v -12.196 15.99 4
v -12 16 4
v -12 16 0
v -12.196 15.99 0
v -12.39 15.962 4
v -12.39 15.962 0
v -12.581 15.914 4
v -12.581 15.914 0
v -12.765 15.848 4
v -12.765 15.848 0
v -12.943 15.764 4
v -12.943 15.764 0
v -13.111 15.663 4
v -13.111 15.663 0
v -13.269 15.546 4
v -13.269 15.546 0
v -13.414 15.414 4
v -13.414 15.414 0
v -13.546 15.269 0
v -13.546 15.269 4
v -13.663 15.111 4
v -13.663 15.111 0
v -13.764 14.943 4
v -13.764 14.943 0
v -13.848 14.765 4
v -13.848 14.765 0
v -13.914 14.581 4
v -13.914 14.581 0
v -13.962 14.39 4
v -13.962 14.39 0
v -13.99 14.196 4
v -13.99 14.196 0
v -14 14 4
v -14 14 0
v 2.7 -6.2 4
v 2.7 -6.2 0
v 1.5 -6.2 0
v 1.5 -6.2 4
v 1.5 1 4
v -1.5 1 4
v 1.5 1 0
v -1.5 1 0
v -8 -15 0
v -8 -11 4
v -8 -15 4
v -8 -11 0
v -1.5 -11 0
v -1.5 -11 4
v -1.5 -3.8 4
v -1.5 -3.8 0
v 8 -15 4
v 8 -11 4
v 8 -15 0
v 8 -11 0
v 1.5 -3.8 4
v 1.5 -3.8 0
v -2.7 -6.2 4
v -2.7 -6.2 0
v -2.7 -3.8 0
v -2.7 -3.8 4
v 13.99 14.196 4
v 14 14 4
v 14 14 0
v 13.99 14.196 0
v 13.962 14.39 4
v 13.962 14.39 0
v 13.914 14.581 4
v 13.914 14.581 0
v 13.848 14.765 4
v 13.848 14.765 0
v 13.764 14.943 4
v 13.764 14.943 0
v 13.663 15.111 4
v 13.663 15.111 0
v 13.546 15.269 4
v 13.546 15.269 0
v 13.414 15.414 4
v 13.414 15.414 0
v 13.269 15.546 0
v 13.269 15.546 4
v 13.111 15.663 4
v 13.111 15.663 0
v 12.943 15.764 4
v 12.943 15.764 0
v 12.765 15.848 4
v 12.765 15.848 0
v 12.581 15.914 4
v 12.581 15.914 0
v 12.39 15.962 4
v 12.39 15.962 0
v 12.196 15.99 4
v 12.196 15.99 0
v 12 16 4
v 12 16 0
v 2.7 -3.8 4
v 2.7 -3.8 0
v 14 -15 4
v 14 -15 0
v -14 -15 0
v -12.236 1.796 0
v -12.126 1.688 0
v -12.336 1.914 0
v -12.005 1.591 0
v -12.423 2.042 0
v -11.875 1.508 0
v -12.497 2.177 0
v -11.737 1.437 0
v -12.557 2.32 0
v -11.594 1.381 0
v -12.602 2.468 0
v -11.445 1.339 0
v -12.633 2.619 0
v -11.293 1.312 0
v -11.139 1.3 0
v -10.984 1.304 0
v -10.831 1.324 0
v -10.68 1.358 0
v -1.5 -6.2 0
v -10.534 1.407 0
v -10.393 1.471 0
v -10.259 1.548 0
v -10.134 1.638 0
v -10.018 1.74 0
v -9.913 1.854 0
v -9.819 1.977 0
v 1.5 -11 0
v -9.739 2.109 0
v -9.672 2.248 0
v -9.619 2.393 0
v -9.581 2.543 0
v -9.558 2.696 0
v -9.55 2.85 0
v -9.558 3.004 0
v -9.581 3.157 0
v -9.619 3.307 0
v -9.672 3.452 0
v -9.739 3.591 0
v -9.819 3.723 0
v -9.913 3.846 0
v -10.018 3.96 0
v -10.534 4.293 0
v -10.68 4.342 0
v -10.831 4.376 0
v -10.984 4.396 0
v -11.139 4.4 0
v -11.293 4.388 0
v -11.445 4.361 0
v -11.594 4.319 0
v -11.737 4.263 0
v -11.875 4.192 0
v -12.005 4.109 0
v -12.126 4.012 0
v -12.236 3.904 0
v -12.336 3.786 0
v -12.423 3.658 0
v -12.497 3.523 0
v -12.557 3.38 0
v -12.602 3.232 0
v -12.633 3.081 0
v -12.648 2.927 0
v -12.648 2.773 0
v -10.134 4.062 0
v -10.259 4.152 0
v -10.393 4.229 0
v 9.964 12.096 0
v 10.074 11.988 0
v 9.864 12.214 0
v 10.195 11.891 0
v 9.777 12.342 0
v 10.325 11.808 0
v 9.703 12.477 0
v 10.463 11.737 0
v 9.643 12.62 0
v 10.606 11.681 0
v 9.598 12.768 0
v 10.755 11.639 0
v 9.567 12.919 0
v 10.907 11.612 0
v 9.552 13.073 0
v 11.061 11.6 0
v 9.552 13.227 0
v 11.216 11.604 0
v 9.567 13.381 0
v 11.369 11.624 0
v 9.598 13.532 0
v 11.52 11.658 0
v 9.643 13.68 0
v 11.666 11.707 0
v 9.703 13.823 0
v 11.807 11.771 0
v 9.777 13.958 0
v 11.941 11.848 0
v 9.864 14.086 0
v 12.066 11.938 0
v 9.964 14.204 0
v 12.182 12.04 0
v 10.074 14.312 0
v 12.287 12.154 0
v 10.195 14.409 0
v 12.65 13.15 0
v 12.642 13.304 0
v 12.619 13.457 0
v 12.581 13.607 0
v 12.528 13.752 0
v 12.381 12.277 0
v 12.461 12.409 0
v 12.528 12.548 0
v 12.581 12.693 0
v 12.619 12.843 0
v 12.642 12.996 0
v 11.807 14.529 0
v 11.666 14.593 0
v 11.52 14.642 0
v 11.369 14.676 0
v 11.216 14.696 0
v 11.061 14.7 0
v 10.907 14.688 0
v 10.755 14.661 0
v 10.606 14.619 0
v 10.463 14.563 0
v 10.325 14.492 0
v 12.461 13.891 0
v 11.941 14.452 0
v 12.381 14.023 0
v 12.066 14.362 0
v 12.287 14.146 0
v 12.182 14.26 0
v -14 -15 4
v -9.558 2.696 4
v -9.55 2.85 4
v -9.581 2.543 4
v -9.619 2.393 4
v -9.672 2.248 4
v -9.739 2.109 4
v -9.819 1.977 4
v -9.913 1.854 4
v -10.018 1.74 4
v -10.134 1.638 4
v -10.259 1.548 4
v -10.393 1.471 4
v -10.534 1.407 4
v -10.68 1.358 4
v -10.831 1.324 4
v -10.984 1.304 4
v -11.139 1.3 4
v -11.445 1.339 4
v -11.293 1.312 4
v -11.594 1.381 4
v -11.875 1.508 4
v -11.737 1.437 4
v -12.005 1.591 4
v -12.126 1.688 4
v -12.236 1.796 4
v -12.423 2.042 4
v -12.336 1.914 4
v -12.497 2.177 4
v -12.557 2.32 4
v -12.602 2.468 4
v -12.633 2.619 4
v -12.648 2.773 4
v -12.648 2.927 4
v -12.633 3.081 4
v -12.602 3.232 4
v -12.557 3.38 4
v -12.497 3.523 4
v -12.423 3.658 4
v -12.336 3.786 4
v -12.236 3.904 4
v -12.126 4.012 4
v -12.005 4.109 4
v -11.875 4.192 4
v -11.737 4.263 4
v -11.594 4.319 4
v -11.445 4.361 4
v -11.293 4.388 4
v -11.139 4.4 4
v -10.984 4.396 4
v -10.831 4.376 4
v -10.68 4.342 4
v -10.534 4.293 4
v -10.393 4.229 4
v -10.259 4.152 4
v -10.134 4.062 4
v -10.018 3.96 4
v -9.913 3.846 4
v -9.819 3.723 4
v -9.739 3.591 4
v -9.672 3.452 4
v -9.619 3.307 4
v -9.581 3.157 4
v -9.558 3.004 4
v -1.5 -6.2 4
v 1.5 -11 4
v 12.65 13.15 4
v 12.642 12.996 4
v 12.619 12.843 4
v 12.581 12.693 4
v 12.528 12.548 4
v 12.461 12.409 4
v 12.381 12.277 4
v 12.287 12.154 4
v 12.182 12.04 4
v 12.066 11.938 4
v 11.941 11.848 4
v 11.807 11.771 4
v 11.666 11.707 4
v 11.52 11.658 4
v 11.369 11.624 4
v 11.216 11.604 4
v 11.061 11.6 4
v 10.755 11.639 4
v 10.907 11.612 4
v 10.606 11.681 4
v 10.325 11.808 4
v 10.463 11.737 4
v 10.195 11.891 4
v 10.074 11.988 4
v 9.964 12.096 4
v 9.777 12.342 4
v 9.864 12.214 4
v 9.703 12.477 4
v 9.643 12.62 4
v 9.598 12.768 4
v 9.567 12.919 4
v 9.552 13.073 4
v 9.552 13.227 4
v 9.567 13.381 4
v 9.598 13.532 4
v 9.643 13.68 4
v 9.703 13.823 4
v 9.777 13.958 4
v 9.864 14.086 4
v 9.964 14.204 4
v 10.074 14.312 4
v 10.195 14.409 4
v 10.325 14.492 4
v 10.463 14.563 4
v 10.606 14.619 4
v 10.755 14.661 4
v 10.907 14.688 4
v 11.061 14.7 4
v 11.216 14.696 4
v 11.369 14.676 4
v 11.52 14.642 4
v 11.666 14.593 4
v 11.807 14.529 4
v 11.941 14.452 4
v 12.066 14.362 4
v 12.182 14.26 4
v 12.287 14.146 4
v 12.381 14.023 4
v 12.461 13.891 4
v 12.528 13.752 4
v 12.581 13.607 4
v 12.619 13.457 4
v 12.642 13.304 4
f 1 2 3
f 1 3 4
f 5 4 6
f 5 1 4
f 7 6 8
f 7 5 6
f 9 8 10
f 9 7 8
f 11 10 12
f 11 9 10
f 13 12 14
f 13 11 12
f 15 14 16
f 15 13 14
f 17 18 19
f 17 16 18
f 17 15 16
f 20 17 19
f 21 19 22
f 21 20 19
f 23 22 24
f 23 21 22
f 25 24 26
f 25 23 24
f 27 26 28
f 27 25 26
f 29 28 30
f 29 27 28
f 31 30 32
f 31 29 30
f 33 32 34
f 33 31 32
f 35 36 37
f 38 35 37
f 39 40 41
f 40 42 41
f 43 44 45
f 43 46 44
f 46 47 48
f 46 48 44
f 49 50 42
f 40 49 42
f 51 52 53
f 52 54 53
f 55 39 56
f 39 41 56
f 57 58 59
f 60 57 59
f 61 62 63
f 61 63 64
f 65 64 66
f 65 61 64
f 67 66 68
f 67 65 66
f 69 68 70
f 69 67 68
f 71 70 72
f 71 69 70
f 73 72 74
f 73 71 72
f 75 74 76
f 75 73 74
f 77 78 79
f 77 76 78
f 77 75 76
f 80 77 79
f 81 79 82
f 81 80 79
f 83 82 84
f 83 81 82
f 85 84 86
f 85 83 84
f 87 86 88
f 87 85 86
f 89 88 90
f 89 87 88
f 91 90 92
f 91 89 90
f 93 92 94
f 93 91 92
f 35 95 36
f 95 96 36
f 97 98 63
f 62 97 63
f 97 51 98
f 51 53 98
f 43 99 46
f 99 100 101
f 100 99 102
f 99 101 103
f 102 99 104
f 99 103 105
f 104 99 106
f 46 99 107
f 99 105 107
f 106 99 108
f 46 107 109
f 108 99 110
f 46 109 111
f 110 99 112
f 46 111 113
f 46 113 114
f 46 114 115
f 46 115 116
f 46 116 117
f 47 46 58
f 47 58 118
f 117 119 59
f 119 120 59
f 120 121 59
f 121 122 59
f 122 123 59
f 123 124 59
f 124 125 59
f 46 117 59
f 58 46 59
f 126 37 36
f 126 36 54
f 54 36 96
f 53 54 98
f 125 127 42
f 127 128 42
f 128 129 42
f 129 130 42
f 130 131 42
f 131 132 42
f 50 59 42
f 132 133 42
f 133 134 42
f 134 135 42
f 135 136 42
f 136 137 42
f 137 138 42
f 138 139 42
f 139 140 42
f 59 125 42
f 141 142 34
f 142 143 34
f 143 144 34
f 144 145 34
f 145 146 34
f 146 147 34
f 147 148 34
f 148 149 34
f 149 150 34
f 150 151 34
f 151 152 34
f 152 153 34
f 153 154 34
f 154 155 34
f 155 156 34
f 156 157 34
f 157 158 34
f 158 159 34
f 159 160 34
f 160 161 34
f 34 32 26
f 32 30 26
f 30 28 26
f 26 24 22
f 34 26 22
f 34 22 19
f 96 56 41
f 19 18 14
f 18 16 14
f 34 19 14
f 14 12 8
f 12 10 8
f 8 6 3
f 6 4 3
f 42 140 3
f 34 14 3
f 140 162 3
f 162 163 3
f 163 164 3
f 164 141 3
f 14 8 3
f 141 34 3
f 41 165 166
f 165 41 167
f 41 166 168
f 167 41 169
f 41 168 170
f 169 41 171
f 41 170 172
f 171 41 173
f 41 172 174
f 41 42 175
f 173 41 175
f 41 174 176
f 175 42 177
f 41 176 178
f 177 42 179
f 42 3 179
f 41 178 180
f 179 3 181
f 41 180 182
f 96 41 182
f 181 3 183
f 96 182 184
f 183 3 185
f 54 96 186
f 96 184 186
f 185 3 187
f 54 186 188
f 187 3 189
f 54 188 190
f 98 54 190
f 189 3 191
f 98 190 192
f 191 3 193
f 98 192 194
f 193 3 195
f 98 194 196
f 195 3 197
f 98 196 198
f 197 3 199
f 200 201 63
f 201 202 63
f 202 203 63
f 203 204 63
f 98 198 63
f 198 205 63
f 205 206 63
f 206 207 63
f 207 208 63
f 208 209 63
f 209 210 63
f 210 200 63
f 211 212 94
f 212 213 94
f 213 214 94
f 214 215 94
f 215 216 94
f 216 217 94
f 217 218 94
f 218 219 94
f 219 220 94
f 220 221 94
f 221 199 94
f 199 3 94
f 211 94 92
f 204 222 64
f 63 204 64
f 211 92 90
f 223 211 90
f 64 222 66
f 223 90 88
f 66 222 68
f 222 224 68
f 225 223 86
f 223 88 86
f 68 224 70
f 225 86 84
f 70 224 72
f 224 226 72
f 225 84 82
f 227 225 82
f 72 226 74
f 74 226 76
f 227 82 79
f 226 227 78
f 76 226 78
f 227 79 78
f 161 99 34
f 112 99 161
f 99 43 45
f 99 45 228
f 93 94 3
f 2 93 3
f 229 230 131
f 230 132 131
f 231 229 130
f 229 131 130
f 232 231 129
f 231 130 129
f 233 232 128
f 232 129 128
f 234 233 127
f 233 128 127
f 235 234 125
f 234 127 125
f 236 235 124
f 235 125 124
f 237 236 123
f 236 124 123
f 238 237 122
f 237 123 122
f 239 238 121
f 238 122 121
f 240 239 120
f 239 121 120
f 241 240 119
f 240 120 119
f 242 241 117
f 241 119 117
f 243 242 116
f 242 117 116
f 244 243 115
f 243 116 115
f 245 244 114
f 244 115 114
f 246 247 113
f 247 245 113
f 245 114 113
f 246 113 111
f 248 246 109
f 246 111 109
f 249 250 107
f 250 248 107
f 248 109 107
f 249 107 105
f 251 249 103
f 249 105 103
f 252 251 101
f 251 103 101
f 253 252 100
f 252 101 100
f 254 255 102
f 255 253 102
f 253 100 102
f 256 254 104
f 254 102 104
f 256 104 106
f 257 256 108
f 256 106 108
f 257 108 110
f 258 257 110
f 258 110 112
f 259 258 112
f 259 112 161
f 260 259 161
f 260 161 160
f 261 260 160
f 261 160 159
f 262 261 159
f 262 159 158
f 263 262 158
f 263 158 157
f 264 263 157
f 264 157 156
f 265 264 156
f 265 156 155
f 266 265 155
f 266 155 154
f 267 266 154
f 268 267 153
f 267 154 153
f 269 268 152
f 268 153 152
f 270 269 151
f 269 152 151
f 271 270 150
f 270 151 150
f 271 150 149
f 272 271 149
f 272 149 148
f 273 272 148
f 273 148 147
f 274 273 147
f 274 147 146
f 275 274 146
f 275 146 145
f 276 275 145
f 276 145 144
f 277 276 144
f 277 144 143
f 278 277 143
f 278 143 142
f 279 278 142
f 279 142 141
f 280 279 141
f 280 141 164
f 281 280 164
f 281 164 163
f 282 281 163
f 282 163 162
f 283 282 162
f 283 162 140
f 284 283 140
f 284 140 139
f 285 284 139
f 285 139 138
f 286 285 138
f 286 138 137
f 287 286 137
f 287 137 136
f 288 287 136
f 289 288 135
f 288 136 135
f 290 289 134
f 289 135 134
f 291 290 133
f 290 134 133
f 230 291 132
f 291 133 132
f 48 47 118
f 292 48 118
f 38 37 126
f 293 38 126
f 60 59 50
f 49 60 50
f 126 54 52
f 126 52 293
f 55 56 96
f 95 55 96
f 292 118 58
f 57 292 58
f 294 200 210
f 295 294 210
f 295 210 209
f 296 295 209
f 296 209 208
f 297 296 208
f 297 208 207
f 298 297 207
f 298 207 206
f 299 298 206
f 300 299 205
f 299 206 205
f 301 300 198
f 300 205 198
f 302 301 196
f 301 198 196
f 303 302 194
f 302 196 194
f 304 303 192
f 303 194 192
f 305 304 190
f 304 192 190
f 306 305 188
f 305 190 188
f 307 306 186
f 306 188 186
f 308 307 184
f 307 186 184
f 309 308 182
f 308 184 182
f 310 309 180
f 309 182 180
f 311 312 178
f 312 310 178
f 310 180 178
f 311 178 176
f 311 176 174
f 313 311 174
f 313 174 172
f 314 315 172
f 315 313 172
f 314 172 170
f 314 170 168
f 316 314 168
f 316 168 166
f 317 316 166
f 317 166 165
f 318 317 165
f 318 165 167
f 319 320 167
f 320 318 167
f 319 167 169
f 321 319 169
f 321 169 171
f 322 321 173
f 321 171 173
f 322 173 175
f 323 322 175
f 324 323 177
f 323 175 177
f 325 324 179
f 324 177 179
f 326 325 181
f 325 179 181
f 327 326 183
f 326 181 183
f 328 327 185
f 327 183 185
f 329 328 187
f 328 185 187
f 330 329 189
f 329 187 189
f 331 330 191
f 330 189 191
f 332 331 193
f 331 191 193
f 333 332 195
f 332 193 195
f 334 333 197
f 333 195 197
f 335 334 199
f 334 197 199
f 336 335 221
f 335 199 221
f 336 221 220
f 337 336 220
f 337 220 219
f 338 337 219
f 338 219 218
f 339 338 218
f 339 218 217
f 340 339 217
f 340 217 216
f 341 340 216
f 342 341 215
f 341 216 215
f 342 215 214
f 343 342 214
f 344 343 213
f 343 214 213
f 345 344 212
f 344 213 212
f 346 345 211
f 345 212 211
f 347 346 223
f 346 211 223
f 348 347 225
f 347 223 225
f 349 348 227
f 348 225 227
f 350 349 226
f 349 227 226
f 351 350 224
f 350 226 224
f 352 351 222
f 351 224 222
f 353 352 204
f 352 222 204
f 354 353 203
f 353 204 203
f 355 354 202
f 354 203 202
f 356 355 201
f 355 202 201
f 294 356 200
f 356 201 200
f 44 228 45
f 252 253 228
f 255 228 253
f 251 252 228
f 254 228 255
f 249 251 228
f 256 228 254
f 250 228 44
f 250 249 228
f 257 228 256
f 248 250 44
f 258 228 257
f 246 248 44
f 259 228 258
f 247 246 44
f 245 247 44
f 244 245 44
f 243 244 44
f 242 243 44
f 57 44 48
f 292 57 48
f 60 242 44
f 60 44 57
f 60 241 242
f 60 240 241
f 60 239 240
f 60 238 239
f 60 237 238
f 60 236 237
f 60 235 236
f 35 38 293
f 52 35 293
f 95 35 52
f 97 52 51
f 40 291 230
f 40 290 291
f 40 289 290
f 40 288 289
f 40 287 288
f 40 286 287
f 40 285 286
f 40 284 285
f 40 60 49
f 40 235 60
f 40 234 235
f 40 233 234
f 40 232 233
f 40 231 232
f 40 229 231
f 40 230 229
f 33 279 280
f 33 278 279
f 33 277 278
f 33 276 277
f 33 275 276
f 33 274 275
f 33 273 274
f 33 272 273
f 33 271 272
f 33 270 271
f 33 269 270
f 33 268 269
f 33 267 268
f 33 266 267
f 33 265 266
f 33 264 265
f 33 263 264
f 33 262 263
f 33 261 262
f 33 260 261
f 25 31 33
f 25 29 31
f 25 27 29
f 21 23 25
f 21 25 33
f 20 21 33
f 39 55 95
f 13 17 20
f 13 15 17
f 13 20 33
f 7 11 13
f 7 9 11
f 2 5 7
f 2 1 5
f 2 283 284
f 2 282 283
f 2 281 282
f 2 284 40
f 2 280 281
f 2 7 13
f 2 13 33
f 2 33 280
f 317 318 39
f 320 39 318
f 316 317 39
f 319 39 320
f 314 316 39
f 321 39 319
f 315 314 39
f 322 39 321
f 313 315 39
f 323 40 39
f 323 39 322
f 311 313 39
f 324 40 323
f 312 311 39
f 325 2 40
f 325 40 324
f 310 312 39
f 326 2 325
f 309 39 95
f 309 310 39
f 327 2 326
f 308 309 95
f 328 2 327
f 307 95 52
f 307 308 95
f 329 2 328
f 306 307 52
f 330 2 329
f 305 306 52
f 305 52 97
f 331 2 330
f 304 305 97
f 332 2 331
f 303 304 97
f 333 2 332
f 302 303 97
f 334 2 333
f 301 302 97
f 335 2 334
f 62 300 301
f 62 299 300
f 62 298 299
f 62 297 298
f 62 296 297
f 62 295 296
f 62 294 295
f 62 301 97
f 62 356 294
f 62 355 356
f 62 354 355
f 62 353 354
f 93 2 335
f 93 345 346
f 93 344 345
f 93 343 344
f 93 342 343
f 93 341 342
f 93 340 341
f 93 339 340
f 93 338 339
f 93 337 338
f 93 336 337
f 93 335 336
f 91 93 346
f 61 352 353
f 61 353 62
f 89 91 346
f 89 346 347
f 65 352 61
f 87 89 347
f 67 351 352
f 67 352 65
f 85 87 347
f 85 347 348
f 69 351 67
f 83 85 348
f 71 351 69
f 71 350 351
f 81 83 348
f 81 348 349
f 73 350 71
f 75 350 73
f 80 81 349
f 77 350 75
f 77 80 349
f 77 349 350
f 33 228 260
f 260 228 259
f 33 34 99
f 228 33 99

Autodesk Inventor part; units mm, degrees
ref_plane "YZ Plane" through (0, 0, 0) normal (1, 0, 0) x (0, 1, 0)
ref_plane "XZ Plane" through (0, 0, 0) normal (0, 1, 0) x (-1, 0, 0)
ref_plane "XY Plane" through (0, 0, 0) normal (0, 0, 1) x (1, 0, 0)
sketch "Sketch1" plane through (0, 0, 0) normal (0, 0, 1) x (1, 0, 0)
  line L0 (-14, 0) -> (14, 0)
  line L1 (14, 0) -> (14, 16)
  line L2 (14, 16) -> (-14, 16)
  line L3 (-14, 16) -> (-14, 0)
  circle A0 centre (-11.1, 2.85) radius 1.55
  circle A1 centre (11.1, 13.15) radius 1.55
  line L4 (-11.1, 2.85) -> (-14, 2.85) construction
  line L5 (11.1, 13.15) -> (14, 13.15) construction
  line L6 (11.1, 13.15) -> (11.1, 16) construction
  line L7 (-11.1, 2.85) -> (-11.1, 0) construction
  line L8 (-14, 0) -> (14, 0) construction
  line L9 (14, 0) -> (14, -11)
  line L10 (14, -11) -> (8, -11) construction
  line L11 (-14, -11) -> (-14, 0)
  line L12 (-14, -11) -> (-8, -11) construction
  line L13 (-8, -11) -> (-8, -15)
  line L14 (-8, -15) -> (-14, -15)
  line L15 (-14, -15) -> (-14, -11)
  line L16 (14, -11) -> (8, -11) construction
  line L17 (8, -11) -> (8, -15)
  line L18 (8, -15) -> (14, -15)
  line L19 (14, -15) -> (14, -11)
  line L20 (-8, -11) -> (-14, -11) construction
  line L21 (8, -11) -> (-8, -11)
  point P0 (0, 0)
  point P1 (0, 0)
  point P2 (14, 0)
  point P3 (14, 0)
  dimension "d0" = 3.1
  dimension "d1" = 22.2
  dimension "d2" = 10.3
  dimension "d3" = 16
  dimension "d4" = 28
  dimension "d5" = 27
  dimension "d8" = 6
  dimension "d9" = 6
  dimension "d10" = 4
extrude "Extrusion1" add sketch "Sketch1" along normal blind 4
sketch "Sketch2" plane through (0, 0, 0) normal (0, 0, -1) x (-1, 0, 0)
  line L0 (8, -11) -> (-8, -11) projected
  line L1 (-1.5, -11) -> (1.5, -11)
  line L2 (1.5, -11) -> (1.5, 1)
  line L3 (1.5, 1) -> (-1.5, 1)
  line L4 (-1.5, 1) -> (-1.5, -11)
  line L5 (-2.7, -6.2) -> (2.7, -6.2)
  line L6 (2.7, -6.2) -> (2.7, -3.8)
  line L7 (2.7, -3.8) -> (-2.7, -3.8)
  line L8 (-2.7, -3.8) -> (-2.7, -6.2)
  point P0 (0, 0)
  point P1 (-2.7, -5)
  point P2 (-1.5, -5)
  point P3 (0, -3.8)
  point P4 (0, 1)
  point P5 (0, -11)
  point P6 (0, -11)
  point P7 (-1.5, -6.2)
  point P8 (1.5, -6.2)
  point P9 (1.5, -3.8)
  point P10 (-1.5, -3.8)
  dimension "d11" = 3
  dimension "d12" = 12
  dimension "d13" = 5.4
  dimension "d14" = 2.4
extrude "Extrusion2" cut sketch "Sketch2" against normal up to next
fillet "Fillet1" radius 2 2 edges at (14, 16, 2) (-14, 16, 2)
properties part number "SwitchHolder_V2" material "MDF Medium Density Fiberboard"
